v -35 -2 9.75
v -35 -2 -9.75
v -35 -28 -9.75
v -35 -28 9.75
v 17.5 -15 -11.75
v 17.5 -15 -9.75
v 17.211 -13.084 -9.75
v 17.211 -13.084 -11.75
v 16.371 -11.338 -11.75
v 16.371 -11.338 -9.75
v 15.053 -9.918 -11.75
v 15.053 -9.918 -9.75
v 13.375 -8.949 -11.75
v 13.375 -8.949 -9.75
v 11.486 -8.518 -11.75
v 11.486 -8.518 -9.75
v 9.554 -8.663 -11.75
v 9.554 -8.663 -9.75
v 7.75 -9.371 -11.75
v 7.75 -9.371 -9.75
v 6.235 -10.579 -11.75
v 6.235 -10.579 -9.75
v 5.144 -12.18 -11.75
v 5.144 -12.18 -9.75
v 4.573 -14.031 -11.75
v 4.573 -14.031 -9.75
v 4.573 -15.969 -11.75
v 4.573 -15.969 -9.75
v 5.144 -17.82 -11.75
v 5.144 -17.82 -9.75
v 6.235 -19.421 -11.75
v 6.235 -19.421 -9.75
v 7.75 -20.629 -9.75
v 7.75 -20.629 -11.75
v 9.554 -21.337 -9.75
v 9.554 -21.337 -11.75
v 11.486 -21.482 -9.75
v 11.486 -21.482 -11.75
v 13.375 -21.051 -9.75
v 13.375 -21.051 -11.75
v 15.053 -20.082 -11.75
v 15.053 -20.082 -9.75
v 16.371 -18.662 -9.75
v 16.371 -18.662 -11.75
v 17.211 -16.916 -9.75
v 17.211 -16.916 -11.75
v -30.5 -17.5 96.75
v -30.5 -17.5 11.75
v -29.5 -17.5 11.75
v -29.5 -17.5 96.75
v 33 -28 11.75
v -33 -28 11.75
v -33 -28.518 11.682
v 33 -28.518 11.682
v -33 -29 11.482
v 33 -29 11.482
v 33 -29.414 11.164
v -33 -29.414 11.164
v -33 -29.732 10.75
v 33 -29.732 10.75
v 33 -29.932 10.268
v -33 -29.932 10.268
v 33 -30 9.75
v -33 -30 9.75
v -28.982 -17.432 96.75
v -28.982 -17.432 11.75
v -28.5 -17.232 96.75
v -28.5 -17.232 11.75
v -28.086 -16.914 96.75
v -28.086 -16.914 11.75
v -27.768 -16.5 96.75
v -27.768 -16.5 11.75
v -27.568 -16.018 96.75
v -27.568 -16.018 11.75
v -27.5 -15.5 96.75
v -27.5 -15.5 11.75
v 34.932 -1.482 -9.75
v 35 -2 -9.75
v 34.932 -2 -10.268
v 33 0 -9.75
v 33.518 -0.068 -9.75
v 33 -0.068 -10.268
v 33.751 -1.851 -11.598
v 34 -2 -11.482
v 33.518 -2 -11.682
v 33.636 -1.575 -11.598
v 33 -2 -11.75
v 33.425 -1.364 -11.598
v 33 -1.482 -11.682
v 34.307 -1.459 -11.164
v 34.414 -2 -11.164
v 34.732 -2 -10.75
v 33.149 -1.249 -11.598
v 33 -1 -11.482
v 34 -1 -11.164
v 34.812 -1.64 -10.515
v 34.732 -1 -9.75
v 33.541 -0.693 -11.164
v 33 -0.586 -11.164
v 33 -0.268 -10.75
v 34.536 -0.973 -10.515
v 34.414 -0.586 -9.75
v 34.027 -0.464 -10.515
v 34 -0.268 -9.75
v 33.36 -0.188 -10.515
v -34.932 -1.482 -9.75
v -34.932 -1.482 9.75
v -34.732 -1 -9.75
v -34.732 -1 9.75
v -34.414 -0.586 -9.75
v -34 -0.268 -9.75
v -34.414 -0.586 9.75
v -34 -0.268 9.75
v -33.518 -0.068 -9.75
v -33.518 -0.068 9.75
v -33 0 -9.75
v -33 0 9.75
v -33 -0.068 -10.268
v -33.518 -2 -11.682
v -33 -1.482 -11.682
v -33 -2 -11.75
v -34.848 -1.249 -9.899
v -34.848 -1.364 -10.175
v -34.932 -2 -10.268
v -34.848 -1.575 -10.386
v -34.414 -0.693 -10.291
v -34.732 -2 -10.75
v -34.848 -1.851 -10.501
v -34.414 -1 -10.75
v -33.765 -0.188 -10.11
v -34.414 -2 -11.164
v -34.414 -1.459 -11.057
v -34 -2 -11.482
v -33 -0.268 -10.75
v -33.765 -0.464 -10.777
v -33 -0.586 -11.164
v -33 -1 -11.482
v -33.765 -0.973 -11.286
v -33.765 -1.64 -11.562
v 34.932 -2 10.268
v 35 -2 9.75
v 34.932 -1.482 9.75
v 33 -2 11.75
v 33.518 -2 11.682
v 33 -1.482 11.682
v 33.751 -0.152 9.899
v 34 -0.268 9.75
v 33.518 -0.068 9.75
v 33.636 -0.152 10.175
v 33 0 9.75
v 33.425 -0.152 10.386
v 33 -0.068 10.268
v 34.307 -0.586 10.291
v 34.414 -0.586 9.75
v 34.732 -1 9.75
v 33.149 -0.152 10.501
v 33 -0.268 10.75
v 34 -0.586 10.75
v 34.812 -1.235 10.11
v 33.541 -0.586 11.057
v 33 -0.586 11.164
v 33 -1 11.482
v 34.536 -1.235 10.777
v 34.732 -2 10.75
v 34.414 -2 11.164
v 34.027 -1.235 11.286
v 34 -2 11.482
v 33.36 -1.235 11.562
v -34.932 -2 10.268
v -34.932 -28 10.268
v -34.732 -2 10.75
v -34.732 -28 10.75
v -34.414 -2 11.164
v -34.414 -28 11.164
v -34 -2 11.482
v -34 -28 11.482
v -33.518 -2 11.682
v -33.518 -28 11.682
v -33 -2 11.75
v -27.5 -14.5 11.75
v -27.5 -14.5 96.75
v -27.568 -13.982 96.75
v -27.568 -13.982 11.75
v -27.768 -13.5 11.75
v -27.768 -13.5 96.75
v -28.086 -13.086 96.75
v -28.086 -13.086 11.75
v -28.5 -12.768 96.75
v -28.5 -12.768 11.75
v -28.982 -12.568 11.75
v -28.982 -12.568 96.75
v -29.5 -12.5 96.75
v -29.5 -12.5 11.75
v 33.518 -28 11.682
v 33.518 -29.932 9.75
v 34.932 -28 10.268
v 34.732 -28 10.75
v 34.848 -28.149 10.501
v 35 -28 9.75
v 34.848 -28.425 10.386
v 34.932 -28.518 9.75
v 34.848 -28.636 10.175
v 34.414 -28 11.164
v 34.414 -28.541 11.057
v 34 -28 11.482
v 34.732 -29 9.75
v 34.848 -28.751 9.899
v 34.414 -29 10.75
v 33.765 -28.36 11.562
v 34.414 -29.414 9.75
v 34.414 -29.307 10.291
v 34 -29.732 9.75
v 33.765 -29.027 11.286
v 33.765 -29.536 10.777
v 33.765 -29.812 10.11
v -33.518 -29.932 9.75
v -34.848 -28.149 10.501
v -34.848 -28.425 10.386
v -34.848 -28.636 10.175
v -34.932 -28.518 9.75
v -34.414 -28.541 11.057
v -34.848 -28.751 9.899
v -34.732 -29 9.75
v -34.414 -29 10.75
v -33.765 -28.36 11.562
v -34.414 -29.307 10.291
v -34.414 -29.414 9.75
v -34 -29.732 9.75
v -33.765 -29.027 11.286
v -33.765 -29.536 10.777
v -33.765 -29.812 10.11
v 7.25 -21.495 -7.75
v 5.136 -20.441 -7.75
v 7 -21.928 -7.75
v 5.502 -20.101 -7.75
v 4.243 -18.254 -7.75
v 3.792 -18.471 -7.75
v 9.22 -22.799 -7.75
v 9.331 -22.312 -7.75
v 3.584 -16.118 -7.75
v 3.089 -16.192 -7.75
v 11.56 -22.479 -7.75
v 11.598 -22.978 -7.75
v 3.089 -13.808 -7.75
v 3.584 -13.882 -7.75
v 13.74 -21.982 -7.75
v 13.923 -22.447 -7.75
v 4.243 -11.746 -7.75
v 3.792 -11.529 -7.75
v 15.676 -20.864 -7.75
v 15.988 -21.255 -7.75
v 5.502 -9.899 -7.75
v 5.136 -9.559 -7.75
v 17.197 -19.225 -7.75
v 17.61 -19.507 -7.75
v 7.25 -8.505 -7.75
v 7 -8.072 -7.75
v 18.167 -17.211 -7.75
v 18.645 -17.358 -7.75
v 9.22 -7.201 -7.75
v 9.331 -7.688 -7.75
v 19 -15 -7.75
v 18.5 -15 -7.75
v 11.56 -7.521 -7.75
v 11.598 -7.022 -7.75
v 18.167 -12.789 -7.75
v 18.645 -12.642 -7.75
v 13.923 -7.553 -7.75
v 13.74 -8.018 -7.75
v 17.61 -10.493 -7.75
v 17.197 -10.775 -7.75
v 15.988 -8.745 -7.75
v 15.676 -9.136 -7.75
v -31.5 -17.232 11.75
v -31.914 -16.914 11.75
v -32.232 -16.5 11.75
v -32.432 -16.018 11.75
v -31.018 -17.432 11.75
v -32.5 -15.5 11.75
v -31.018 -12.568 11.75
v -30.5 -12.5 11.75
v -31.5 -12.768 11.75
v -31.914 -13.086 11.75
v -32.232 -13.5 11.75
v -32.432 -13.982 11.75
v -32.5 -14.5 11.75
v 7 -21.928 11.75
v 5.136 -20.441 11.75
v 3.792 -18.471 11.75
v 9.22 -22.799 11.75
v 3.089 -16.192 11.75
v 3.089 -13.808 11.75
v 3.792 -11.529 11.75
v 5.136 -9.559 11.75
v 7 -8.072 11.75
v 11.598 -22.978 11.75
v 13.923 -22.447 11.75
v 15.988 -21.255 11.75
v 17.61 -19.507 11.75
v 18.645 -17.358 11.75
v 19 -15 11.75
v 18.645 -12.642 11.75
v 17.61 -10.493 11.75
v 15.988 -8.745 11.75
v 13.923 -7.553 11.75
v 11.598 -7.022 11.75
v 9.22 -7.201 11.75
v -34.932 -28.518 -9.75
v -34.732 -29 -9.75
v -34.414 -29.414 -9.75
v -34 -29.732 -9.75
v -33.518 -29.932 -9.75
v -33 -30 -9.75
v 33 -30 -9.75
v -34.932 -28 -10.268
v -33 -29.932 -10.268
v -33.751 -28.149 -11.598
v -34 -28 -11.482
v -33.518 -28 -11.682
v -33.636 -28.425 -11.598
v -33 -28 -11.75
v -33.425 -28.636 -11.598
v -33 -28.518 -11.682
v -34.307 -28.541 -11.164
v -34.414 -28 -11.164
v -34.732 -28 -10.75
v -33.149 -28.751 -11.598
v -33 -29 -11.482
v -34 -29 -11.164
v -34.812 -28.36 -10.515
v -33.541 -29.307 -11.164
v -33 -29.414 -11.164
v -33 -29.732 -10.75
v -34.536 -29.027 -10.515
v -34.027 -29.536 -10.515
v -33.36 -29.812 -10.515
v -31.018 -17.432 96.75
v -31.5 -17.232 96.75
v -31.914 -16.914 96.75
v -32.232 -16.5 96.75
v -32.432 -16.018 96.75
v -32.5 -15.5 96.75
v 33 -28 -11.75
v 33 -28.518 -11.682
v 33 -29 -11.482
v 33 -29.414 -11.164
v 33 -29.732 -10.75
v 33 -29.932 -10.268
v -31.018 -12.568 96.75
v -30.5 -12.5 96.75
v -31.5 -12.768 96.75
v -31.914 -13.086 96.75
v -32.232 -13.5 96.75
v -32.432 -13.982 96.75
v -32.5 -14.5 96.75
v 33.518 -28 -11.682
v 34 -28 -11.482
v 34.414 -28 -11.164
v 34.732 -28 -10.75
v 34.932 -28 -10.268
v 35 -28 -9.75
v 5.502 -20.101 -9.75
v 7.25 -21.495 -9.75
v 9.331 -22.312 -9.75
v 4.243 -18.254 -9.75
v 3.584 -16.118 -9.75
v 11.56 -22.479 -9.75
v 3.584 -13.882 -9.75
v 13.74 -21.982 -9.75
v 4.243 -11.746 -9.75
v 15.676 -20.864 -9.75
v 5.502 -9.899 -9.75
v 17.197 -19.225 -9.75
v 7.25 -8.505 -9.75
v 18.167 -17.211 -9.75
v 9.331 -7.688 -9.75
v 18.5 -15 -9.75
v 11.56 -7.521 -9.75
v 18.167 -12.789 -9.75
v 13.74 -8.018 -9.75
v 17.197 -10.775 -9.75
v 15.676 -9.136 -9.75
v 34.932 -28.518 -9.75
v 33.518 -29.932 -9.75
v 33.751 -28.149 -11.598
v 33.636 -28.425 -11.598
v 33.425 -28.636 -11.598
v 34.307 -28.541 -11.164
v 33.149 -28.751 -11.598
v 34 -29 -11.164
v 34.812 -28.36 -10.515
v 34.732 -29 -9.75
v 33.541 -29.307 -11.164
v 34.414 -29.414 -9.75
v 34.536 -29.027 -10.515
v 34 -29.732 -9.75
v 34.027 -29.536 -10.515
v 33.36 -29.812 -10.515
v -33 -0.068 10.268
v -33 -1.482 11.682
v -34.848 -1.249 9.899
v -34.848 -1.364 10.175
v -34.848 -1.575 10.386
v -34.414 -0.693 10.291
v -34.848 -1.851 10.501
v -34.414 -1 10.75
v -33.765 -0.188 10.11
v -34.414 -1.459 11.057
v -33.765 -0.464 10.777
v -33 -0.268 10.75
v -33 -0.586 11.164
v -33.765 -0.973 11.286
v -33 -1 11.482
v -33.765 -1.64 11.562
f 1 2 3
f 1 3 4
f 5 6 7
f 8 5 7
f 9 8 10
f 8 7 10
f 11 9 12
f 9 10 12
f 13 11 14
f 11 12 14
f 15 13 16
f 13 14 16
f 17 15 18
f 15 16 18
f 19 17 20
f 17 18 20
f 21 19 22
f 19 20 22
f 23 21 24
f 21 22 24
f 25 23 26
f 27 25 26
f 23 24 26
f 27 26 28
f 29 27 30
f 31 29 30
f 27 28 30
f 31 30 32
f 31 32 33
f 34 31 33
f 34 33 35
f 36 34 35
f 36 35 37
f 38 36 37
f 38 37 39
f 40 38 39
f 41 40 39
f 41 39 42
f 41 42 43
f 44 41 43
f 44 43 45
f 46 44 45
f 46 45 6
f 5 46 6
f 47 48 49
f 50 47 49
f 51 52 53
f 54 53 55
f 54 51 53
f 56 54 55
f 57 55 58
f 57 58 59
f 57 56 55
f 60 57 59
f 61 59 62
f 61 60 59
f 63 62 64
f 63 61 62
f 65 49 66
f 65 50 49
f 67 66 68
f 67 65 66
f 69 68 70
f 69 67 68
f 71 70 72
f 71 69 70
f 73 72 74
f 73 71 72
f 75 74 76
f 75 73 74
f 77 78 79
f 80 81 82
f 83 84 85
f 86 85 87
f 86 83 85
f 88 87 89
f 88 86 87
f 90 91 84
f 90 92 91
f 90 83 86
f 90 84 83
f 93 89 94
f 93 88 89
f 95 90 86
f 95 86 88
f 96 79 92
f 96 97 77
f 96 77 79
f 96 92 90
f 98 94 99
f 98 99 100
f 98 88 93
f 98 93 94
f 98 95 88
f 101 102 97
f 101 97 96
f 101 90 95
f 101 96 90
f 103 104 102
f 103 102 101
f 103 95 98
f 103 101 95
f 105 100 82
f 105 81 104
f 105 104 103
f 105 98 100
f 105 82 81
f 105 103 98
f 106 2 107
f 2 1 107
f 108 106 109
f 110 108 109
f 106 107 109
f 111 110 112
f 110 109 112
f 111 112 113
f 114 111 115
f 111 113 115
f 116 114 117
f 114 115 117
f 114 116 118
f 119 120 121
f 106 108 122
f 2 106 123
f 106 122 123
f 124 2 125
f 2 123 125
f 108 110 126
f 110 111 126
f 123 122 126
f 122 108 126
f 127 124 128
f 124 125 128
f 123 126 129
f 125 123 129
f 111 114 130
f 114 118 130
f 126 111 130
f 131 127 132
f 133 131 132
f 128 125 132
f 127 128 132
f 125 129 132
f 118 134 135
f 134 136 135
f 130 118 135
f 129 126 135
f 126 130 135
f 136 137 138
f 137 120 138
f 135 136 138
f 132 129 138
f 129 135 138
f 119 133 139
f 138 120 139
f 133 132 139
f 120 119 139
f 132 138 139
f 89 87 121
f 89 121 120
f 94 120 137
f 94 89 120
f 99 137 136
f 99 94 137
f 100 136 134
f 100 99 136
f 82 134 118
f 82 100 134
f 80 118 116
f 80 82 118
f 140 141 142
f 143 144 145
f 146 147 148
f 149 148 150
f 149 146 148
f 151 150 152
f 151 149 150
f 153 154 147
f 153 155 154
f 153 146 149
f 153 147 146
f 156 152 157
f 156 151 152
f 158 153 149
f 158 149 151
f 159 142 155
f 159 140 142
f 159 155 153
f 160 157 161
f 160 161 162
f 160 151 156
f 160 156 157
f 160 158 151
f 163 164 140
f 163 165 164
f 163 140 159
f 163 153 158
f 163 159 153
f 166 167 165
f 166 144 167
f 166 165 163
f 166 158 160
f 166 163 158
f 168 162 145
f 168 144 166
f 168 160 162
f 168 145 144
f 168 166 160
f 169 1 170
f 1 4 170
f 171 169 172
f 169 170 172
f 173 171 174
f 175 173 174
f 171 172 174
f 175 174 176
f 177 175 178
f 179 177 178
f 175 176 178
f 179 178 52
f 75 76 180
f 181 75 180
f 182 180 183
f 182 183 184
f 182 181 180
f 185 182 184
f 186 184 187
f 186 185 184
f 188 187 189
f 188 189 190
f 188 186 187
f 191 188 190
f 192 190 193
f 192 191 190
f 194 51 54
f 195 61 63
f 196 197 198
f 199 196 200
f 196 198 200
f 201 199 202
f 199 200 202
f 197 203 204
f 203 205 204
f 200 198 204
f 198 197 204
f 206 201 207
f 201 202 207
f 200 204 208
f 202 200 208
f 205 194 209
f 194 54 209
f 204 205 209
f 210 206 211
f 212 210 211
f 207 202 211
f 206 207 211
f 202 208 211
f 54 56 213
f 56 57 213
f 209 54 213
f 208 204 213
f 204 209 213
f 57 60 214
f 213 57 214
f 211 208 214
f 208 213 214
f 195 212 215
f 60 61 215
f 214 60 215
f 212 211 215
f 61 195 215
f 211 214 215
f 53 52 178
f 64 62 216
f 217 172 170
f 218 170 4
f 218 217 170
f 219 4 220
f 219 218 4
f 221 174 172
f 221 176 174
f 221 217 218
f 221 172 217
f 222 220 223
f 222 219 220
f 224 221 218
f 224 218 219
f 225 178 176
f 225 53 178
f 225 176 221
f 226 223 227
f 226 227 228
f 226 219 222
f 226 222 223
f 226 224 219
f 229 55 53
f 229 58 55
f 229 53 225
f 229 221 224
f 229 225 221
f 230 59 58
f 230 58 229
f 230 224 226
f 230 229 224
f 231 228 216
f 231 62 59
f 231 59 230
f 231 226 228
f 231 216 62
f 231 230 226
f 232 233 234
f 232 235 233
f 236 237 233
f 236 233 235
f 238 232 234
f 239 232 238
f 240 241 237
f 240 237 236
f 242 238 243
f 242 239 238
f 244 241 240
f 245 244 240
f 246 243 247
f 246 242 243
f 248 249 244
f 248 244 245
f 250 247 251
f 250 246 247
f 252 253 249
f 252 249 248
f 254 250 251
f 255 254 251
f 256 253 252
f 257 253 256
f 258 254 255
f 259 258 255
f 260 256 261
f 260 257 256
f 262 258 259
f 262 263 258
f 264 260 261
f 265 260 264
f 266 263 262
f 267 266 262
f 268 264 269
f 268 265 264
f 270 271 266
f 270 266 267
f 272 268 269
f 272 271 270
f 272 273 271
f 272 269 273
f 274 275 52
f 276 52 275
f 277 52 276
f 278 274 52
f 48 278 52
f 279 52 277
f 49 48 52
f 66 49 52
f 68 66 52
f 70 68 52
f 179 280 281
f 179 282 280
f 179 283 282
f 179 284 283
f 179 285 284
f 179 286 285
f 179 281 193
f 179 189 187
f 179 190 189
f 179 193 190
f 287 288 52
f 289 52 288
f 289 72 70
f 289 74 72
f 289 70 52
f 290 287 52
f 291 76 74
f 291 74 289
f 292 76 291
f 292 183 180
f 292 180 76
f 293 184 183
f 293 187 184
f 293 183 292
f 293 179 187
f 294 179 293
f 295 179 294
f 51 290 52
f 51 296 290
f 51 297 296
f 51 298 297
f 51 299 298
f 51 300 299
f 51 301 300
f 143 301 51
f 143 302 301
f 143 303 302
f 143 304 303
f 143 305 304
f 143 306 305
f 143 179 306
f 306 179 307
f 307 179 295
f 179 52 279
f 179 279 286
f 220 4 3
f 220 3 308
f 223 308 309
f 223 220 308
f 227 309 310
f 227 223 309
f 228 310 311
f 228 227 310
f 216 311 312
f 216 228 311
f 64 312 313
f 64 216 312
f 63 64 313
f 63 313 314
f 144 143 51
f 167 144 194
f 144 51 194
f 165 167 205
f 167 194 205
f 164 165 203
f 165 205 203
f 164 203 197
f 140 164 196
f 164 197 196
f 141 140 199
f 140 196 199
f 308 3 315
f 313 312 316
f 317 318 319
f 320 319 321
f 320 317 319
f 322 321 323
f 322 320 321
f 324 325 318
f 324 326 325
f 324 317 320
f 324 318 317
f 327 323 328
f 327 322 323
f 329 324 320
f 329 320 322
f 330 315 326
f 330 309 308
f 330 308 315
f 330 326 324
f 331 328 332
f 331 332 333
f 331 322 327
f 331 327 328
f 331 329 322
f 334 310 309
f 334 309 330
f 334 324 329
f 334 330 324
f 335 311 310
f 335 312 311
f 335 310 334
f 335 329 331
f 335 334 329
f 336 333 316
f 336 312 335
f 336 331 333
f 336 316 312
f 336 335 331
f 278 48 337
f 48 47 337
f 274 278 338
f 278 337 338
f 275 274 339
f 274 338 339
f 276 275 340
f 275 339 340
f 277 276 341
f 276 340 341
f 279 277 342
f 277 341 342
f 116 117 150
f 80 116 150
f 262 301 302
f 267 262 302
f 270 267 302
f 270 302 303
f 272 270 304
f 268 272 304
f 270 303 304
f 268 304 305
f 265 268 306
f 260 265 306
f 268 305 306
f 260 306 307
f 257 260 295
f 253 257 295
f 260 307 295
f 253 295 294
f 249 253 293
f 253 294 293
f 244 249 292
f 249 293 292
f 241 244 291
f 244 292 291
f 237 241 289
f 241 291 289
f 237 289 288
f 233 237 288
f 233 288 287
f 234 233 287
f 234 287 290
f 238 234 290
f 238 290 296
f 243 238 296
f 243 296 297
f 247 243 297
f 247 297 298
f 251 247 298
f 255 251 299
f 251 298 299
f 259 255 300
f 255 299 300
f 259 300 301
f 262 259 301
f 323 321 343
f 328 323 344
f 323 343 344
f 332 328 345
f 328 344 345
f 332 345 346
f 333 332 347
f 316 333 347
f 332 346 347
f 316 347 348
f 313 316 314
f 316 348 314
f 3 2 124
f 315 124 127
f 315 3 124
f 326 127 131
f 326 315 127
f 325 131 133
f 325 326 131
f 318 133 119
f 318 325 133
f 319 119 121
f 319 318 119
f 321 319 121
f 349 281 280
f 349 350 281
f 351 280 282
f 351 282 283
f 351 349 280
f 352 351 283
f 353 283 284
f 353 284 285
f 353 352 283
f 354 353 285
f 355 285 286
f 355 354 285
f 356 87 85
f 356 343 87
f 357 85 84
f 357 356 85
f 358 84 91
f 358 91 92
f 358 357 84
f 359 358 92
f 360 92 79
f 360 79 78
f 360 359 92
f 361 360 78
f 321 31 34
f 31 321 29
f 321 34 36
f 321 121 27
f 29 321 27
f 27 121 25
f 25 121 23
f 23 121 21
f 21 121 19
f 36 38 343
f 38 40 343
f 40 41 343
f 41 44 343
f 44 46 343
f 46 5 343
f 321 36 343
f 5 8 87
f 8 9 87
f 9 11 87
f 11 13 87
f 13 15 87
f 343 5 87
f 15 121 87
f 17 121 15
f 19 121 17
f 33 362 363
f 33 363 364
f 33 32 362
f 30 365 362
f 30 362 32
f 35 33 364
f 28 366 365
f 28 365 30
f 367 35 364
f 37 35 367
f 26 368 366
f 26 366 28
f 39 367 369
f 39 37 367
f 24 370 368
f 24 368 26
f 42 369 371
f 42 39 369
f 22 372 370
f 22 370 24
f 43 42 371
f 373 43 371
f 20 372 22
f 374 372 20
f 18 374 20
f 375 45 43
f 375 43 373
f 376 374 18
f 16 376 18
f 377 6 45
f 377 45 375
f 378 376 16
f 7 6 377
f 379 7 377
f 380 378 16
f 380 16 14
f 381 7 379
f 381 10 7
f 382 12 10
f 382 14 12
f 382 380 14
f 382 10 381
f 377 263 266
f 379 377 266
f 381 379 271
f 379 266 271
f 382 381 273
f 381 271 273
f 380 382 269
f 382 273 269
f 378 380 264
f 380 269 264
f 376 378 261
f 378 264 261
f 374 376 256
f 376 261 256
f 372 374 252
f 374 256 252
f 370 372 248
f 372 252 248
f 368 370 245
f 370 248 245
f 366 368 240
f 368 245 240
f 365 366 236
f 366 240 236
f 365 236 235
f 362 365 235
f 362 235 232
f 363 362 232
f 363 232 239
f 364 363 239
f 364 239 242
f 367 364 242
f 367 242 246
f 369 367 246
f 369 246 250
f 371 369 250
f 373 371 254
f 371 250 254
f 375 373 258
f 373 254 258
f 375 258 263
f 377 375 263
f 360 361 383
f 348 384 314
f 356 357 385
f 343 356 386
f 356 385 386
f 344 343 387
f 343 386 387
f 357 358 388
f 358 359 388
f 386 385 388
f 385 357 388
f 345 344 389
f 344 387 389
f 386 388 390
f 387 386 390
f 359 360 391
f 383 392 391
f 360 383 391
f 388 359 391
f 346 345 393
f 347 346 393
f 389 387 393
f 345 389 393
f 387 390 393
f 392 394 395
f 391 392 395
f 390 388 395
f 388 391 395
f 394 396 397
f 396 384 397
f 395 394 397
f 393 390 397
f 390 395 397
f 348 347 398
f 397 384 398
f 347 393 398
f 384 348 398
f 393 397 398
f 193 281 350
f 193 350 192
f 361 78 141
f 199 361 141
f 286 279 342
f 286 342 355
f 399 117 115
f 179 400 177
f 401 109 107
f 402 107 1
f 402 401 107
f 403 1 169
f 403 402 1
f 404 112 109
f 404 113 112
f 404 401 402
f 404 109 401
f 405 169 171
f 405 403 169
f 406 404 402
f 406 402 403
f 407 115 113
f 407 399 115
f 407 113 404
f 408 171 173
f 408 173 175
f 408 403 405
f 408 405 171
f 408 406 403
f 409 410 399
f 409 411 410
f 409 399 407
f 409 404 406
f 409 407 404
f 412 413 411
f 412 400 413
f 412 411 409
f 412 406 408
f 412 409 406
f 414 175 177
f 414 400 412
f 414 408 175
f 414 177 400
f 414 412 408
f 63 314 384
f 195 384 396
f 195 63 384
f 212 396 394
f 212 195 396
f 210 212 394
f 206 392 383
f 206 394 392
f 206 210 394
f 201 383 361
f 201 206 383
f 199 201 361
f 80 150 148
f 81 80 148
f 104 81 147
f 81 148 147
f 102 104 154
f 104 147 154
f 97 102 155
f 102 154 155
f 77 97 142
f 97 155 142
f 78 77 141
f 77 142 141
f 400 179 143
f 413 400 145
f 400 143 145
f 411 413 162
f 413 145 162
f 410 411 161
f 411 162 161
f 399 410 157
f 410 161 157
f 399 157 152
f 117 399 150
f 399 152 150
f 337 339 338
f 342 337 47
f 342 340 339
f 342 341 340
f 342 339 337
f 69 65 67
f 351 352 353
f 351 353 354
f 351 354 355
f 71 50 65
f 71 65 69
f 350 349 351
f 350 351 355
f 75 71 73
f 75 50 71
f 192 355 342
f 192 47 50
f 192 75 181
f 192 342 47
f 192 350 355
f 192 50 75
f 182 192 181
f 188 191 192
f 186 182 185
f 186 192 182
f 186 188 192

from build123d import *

# Parameters (mm, degrees)
F0_W     = 70
F0_H     = 23.5
F1_DEPTH = 30
F2_R     = 8
F3_DEPTH = 19.5
F4_R     = 7.5
F5_DEPTH = 2
F6_R     = 6.5
F7_DEPTH = 2.001
F8_W     = 5
F8_H     = 5
F9_DEPTH = 85
F10_R    = 2


with BuildPart() as f1:
    # F0 (on Front) → F1 (new body)
    with BuildSketch(Plane.XZ):
        Rectangle(F0_W, F0_H)
    extrude(amount=F1_DEPTH)

    # F2 (on face) → F3 (cut)
    with BuildSketch(Plane.XY.offset(11.75)):
        with Locations((11, -15)):
            Circle(F2_R)
    extrude(amount=-F3_DEPTH, mode=Mode.SUBTRACT)

    # F4 (on face) → F5 (cut)
    with BuildSketch(Plane.XY.offset(-7.75)):
        with Locations((11, -15)):
            Circle(F4_R)
    extrude(amount=-F5_DEPTH, mode=Mode.SUBTRACT)

    # F6 (on face) → F7 (cut, through all)
    with BuildSketch(Plane.XY.offset(-9.75)):
        with Locations((11, -15)):
            Circle(F6_R)
    extrude(amount=-F7_DEPTH, mode=Mode.SUBTRACT)

    # F8 (on face) → F9 (join)
    with BuildSketch(Plane.XY.offset(11.75)):
        with Locations((-30, -15)):
            Rectangle(F8_W, F8_H)
    extrude(amount=F9_DEPTH)

    # F10
    f10_edges = [f1.edges().sort_by_distance(p)[0] for p in [
        (0, -30, 11.75),
        (35, -15, 11.75),
        (35, -30, 0),
        (35, 0, 0),
        (35, -15, -11.75),
        (0, 0, 11.75),
        (0, 0, -11.75),
        (-35, 0, 0),
        (-35, -15, 11.75),
        (-35, -30, 0),
        (-35, -15, -11.75),
        (0, -30, -11.75),
        (-32.5, -17.5, 54.25),
        (-27.5, -17.5, 54.25),
        (-27.5, -12.5, 54.25),
        (-32.5, -12.5, 54.25),
    ]]
    fillet(f10_edges, radius=F10_R)


solid = f1.part
